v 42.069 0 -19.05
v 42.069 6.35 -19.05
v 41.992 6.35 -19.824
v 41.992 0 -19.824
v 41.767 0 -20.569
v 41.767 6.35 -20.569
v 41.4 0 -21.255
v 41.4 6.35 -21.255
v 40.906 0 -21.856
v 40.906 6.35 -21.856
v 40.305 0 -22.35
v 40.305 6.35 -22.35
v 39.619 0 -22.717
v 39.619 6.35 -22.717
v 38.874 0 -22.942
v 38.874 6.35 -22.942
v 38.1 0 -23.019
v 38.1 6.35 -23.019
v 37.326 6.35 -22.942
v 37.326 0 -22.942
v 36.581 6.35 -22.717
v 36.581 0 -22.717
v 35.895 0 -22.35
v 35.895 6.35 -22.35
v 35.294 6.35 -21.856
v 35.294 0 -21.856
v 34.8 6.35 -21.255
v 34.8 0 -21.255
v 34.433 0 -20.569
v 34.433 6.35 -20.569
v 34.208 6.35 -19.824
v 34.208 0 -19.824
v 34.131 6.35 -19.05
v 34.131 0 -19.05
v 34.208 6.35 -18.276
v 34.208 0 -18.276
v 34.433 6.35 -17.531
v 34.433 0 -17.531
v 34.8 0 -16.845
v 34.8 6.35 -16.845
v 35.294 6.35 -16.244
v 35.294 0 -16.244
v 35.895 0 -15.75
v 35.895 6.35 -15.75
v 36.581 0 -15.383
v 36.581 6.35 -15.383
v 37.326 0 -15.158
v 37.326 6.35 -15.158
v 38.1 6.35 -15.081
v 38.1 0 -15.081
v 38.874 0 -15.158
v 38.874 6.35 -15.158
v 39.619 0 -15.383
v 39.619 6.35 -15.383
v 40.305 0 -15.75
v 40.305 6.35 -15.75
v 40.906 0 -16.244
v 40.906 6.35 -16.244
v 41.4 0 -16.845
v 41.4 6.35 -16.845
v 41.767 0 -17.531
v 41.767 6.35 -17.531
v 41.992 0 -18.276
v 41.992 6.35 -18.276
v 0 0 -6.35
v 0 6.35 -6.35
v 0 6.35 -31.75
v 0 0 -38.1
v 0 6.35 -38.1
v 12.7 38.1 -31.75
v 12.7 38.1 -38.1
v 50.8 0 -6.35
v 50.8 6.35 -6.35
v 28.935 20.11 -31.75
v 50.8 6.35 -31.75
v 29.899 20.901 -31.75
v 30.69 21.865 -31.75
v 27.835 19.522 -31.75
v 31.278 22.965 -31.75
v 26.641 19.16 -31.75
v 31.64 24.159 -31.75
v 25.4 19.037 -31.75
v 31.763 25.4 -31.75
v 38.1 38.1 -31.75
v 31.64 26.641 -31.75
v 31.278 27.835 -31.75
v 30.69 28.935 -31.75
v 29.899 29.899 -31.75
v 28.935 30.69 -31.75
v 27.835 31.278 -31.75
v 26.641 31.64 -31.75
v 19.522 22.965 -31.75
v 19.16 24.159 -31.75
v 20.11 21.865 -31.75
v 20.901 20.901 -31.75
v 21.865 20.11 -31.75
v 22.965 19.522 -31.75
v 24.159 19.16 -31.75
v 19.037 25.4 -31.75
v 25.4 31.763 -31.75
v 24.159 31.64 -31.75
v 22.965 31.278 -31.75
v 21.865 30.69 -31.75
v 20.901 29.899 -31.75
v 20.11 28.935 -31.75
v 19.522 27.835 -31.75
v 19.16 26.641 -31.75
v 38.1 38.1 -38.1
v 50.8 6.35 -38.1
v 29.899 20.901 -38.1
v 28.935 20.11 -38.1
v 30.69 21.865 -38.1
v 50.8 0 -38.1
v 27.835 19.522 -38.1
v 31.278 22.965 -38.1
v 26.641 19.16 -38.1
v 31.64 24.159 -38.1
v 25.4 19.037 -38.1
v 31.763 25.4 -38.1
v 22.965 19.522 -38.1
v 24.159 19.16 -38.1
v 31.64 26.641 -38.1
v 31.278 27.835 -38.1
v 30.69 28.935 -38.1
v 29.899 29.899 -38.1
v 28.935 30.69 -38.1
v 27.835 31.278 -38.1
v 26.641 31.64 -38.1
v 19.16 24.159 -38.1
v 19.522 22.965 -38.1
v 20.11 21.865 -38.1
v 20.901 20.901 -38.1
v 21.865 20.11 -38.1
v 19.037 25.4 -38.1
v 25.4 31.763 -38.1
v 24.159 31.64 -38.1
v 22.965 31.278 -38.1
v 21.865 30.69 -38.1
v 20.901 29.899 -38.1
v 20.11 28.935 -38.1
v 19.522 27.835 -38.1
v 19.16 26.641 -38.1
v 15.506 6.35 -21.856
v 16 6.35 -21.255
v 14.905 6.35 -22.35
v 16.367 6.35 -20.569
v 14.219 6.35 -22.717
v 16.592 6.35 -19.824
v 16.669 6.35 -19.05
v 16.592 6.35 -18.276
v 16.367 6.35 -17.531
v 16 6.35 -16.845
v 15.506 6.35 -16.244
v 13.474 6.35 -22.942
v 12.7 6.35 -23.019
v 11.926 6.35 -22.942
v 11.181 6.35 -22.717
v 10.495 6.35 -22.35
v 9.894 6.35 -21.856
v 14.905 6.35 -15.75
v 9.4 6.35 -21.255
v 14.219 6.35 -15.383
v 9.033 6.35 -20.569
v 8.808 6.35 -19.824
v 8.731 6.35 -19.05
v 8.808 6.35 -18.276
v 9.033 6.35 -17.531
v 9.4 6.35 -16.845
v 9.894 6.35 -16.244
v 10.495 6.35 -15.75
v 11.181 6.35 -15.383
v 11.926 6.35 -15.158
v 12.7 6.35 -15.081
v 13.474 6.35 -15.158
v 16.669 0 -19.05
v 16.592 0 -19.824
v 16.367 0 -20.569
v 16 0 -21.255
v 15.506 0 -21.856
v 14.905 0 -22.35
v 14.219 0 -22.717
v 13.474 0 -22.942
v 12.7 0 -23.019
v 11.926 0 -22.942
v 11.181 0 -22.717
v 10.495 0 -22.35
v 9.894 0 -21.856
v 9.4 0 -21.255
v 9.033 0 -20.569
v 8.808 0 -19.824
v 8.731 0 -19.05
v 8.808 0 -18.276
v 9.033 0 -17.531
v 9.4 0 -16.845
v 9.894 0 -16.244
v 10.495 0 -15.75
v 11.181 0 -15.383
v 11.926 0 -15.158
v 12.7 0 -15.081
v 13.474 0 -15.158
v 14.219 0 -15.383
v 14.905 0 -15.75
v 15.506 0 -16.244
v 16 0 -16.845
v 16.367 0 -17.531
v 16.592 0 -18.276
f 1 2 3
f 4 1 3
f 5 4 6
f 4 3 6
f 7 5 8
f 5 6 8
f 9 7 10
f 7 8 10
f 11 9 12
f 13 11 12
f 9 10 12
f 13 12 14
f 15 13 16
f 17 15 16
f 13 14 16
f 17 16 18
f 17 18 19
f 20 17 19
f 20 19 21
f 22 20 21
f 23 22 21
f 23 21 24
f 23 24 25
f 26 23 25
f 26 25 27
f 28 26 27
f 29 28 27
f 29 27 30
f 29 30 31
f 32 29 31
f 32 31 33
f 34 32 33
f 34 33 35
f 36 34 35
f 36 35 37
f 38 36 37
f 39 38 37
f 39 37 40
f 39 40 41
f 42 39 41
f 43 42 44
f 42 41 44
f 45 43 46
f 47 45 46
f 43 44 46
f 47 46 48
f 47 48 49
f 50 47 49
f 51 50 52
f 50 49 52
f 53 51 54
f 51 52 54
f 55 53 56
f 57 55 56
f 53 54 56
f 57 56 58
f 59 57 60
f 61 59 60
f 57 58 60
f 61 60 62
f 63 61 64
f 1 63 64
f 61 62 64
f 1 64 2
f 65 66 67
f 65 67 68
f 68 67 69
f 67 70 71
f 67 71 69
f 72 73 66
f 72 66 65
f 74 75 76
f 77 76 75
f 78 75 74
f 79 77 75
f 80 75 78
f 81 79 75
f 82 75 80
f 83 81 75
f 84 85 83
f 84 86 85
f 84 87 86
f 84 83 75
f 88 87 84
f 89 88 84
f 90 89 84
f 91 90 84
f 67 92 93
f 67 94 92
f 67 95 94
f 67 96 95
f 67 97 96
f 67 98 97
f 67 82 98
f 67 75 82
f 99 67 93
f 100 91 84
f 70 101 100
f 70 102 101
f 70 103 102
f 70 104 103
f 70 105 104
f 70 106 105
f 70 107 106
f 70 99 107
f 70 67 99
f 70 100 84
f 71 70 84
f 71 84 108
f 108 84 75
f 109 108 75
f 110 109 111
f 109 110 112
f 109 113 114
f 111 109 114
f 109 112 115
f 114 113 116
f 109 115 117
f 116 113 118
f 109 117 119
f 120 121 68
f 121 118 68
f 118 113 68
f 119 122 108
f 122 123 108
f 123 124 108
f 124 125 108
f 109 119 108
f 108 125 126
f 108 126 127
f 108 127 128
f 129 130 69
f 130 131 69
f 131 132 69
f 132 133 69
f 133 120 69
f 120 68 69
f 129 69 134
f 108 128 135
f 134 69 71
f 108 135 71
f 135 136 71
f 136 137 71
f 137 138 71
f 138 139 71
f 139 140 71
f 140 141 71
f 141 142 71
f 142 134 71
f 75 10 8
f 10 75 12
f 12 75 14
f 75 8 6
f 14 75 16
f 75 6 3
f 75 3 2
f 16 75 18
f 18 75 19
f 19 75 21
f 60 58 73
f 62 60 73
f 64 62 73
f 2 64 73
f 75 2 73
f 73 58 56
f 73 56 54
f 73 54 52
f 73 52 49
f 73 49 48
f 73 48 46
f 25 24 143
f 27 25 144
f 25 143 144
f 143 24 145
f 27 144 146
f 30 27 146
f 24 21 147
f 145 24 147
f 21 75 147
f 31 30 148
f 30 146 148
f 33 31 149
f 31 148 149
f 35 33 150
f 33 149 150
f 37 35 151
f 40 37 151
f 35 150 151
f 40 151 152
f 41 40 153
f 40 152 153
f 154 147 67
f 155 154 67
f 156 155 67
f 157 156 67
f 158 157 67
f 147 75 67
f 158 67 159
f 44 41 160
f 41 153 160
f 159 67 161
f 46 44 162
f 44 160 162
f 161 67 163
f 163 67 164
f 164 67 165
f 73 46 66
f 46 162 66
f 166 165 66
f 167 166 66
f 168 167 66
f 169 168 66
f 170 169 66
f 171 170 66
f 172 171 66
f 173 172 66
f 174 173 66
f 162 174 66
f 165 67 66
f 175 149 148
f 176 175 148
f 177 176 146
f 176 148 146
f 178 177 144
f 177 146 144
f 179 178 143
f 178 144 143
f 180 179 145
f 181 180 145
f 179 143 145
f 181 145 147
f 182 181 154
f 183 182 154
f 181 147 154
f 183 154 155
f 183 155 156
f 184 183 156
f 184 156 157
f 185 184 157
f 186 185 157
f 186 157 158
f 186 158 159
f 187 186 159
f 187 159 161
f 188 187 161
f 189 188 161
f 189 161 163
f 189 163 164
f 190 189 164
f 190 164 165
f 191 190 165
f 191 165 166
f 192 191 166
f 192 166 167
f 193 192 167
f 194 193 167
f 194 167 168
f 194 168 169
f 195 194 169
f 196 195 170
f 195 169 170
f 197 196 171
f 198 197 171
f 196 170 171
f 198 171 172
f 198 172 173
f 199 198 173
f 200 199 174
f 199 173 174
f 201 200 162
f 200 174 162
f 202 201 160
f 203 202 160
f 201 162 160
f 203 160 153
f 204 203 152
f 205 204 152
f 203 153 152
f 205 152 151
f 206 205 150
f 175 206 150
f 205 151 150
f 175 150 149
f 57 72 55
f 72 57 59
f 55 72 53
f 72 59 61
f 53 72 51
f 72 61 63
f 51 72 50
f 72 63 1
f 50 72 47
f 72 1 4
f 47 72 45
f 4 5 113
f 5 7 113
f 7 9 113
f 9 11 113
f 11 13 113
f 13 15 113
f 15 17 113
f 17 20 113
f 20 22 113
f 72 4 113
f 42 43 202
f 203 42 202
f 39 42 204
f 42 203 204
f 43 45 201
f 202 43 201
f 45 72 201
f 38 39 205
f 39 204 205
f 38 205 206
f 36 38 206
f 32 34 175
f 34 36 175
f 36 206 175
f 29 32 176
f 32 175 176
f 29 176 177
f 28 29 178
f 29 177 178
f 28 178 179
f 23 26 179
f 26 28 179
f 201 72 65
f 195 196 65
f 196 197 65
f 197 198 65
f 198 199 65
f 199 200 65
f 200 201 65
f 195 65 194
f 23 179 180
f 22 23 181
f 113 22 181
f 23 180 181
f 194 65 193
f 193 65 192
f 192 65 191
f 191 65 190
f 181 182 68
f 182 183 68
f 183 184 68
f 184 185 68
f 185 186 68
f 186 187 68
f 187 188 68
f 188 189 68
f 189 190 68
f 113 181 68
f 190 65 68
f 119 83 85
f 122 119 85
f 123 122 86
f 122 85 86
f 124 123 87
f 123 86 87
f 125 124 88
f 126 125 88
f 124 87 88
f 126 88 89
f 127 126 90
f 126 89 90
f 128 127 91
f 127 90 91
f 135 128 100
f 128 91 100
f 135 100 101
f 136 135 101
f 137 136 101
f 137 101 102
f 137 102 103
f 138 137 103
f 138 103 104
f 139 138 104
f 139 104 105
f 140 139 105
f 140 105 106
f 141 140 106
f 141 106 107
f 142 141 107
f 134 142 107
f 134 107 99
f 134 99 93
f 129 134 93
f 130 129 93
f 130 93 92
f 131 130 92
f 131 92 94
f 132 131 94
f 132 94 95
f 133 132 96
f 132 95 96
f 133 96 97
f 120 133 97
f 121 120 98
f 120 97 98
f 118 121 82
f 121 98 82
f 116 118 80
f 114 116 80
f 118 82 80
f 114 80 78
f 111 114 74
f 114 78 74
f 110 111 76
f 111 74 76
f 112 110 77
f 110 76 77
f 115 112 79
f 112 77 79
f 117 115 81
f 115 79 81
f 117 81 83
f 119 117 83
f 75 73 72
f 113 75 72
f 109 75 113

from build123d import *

# Parameters (mm, degrees)
SKETCH1_W           = 6.35
SKETCH1_H           = 31.75
BOSS_EXTRUDE1_DEPTH = 50.8
BASE_MOUNTS_REACH   = 8.35
SKETCH2_R           = 3.96875
PEDAL_HINGE_REACH   = 8.35
SKETCH3_R           = 6.3627


with BuildPart() as part:
    # Sketch1 → Boss-Extrude1 (new body)
    with BuildSketch(Plane(origin=(0, 0, 0), x_dir=(0, 0, -1), z_dir=(1, 0, 0))):
        Polygon((6.35, 6.35), (6.35, 0), (38.1, 0), (38.1, 6.35), (31.75, 6.35), align=None)
        with Locations((34.925, 22.225)):
            Rectangle(SKETCH1_W, SKETCH1_H)
    extrude(amount=BOSS_EXTRUDE1_DEPTH)

    # Sketch2 → Base Mounts (cut, up to next)
    with BuildSketch(Plane(origin=(0, 6.35, 0), x_dir=(1, 0, 0), z_dir=(0, 1, 0)), mode=Mode.PRIVATE) as base_mounts_sk1:
        with Locations((38.1, 19.05)):
            Circle(SKETCH2_R)
    base_mounts_tool1 = extrude(base_mounts_sk1.sketch, amount=-BASE_MOUNTS_REACH, mode=Mode.PRIVATE) & part.part
    add(base_mounts_tool1.solids().sort_by_distance((38.1, 6.35, -19.05))[0], mode=Mode.SUBTRACT)
    # Sketch2 → Base Mounts (cut, up to next)
    with BuildSketch(Plane(origin=(0, 6.35, 0), x_dir=(1, 0, 0), z_dir=(0, 1, 0)), mode=Mode.PRIVATE) as base_mounts_sk2:
        with Locations((12.7, 19.05)):
            Circle(SKETCH2_R)
    base_mounts_tool2 = extrude(base_mounts_sk2.sketch, amount=-BASE_MOUNTS_REACH, mode=Mode.PRIVATE) & part.part
    add(base_mounts_tool2.solids().sort_by_distance((12.7, 6.35, -19.05))[0], mode=Mode.SUBTRACT)

    # Sketch3 → Pedal Hinge (cut, up to next)
    with BuildSketch(Plane.XY.offset(-31.75), mode=Mode.PRIVATE) as pedal_hinge_sk1:
        with Locations((25.4, 25.4)):
            Circle(SKETCH3_R)
    pedal_hinge_tool1 = extrude(pedal_hinge_sk1.sketch, amount=-PEDAL_HINGE_REACH, mode=Mode.PRIVATE) & part.part
    add(pedal_hinge_tool1.solids().sort_by_distance((25.4, 25.4, -31.75))[0], mode=Mode.SUBTRACT)
    # Sketch3 → Pedal Hinge (cut, up to next)
    with BuildSketch(Plane.XY.offset(-31.75), mode=Mode.PRIVATE) as pedal_hinge_sk2:
        Polygon((50.8, 6.35), (50.8, 38.1), (38.1, 38.1), align=None)
    pedal_hinge_tool2 = extrude(pedal_hinge_sk2.sketch, amount=-PEDAL_HINGE_REACH, mode=Mode.PRIVATE) & part.part
    add(pedal_hinge_tool2.solids().sort_by_distance((46.566667, 27.516667, -31.75))[0], mode=Mode.SUBTRACT)
    # Sketch3 → Pedal Hinge (cut, up to next)
    with BuildSketch(Plane.XY.offset(-31.75), mode=Mode.PRIVATE) as pedal_hinge_sk3:
        Polygon((0, 6.35), (0, 38.1), (12.7, 38.1), align=None)
    pedal_hinge_tool3 = extrude(pedal_hinge_sk3.sketch, amount=-PEDAL_HINGE_REACH, mode=Mode.PRIVATE) & part.part
    add(pedal_hinge_tool3.solids().sort_by_distance((4.233333, 27.516667, -31.75))[0], mode=Mode.SUBTRACT)


solid = part.part
